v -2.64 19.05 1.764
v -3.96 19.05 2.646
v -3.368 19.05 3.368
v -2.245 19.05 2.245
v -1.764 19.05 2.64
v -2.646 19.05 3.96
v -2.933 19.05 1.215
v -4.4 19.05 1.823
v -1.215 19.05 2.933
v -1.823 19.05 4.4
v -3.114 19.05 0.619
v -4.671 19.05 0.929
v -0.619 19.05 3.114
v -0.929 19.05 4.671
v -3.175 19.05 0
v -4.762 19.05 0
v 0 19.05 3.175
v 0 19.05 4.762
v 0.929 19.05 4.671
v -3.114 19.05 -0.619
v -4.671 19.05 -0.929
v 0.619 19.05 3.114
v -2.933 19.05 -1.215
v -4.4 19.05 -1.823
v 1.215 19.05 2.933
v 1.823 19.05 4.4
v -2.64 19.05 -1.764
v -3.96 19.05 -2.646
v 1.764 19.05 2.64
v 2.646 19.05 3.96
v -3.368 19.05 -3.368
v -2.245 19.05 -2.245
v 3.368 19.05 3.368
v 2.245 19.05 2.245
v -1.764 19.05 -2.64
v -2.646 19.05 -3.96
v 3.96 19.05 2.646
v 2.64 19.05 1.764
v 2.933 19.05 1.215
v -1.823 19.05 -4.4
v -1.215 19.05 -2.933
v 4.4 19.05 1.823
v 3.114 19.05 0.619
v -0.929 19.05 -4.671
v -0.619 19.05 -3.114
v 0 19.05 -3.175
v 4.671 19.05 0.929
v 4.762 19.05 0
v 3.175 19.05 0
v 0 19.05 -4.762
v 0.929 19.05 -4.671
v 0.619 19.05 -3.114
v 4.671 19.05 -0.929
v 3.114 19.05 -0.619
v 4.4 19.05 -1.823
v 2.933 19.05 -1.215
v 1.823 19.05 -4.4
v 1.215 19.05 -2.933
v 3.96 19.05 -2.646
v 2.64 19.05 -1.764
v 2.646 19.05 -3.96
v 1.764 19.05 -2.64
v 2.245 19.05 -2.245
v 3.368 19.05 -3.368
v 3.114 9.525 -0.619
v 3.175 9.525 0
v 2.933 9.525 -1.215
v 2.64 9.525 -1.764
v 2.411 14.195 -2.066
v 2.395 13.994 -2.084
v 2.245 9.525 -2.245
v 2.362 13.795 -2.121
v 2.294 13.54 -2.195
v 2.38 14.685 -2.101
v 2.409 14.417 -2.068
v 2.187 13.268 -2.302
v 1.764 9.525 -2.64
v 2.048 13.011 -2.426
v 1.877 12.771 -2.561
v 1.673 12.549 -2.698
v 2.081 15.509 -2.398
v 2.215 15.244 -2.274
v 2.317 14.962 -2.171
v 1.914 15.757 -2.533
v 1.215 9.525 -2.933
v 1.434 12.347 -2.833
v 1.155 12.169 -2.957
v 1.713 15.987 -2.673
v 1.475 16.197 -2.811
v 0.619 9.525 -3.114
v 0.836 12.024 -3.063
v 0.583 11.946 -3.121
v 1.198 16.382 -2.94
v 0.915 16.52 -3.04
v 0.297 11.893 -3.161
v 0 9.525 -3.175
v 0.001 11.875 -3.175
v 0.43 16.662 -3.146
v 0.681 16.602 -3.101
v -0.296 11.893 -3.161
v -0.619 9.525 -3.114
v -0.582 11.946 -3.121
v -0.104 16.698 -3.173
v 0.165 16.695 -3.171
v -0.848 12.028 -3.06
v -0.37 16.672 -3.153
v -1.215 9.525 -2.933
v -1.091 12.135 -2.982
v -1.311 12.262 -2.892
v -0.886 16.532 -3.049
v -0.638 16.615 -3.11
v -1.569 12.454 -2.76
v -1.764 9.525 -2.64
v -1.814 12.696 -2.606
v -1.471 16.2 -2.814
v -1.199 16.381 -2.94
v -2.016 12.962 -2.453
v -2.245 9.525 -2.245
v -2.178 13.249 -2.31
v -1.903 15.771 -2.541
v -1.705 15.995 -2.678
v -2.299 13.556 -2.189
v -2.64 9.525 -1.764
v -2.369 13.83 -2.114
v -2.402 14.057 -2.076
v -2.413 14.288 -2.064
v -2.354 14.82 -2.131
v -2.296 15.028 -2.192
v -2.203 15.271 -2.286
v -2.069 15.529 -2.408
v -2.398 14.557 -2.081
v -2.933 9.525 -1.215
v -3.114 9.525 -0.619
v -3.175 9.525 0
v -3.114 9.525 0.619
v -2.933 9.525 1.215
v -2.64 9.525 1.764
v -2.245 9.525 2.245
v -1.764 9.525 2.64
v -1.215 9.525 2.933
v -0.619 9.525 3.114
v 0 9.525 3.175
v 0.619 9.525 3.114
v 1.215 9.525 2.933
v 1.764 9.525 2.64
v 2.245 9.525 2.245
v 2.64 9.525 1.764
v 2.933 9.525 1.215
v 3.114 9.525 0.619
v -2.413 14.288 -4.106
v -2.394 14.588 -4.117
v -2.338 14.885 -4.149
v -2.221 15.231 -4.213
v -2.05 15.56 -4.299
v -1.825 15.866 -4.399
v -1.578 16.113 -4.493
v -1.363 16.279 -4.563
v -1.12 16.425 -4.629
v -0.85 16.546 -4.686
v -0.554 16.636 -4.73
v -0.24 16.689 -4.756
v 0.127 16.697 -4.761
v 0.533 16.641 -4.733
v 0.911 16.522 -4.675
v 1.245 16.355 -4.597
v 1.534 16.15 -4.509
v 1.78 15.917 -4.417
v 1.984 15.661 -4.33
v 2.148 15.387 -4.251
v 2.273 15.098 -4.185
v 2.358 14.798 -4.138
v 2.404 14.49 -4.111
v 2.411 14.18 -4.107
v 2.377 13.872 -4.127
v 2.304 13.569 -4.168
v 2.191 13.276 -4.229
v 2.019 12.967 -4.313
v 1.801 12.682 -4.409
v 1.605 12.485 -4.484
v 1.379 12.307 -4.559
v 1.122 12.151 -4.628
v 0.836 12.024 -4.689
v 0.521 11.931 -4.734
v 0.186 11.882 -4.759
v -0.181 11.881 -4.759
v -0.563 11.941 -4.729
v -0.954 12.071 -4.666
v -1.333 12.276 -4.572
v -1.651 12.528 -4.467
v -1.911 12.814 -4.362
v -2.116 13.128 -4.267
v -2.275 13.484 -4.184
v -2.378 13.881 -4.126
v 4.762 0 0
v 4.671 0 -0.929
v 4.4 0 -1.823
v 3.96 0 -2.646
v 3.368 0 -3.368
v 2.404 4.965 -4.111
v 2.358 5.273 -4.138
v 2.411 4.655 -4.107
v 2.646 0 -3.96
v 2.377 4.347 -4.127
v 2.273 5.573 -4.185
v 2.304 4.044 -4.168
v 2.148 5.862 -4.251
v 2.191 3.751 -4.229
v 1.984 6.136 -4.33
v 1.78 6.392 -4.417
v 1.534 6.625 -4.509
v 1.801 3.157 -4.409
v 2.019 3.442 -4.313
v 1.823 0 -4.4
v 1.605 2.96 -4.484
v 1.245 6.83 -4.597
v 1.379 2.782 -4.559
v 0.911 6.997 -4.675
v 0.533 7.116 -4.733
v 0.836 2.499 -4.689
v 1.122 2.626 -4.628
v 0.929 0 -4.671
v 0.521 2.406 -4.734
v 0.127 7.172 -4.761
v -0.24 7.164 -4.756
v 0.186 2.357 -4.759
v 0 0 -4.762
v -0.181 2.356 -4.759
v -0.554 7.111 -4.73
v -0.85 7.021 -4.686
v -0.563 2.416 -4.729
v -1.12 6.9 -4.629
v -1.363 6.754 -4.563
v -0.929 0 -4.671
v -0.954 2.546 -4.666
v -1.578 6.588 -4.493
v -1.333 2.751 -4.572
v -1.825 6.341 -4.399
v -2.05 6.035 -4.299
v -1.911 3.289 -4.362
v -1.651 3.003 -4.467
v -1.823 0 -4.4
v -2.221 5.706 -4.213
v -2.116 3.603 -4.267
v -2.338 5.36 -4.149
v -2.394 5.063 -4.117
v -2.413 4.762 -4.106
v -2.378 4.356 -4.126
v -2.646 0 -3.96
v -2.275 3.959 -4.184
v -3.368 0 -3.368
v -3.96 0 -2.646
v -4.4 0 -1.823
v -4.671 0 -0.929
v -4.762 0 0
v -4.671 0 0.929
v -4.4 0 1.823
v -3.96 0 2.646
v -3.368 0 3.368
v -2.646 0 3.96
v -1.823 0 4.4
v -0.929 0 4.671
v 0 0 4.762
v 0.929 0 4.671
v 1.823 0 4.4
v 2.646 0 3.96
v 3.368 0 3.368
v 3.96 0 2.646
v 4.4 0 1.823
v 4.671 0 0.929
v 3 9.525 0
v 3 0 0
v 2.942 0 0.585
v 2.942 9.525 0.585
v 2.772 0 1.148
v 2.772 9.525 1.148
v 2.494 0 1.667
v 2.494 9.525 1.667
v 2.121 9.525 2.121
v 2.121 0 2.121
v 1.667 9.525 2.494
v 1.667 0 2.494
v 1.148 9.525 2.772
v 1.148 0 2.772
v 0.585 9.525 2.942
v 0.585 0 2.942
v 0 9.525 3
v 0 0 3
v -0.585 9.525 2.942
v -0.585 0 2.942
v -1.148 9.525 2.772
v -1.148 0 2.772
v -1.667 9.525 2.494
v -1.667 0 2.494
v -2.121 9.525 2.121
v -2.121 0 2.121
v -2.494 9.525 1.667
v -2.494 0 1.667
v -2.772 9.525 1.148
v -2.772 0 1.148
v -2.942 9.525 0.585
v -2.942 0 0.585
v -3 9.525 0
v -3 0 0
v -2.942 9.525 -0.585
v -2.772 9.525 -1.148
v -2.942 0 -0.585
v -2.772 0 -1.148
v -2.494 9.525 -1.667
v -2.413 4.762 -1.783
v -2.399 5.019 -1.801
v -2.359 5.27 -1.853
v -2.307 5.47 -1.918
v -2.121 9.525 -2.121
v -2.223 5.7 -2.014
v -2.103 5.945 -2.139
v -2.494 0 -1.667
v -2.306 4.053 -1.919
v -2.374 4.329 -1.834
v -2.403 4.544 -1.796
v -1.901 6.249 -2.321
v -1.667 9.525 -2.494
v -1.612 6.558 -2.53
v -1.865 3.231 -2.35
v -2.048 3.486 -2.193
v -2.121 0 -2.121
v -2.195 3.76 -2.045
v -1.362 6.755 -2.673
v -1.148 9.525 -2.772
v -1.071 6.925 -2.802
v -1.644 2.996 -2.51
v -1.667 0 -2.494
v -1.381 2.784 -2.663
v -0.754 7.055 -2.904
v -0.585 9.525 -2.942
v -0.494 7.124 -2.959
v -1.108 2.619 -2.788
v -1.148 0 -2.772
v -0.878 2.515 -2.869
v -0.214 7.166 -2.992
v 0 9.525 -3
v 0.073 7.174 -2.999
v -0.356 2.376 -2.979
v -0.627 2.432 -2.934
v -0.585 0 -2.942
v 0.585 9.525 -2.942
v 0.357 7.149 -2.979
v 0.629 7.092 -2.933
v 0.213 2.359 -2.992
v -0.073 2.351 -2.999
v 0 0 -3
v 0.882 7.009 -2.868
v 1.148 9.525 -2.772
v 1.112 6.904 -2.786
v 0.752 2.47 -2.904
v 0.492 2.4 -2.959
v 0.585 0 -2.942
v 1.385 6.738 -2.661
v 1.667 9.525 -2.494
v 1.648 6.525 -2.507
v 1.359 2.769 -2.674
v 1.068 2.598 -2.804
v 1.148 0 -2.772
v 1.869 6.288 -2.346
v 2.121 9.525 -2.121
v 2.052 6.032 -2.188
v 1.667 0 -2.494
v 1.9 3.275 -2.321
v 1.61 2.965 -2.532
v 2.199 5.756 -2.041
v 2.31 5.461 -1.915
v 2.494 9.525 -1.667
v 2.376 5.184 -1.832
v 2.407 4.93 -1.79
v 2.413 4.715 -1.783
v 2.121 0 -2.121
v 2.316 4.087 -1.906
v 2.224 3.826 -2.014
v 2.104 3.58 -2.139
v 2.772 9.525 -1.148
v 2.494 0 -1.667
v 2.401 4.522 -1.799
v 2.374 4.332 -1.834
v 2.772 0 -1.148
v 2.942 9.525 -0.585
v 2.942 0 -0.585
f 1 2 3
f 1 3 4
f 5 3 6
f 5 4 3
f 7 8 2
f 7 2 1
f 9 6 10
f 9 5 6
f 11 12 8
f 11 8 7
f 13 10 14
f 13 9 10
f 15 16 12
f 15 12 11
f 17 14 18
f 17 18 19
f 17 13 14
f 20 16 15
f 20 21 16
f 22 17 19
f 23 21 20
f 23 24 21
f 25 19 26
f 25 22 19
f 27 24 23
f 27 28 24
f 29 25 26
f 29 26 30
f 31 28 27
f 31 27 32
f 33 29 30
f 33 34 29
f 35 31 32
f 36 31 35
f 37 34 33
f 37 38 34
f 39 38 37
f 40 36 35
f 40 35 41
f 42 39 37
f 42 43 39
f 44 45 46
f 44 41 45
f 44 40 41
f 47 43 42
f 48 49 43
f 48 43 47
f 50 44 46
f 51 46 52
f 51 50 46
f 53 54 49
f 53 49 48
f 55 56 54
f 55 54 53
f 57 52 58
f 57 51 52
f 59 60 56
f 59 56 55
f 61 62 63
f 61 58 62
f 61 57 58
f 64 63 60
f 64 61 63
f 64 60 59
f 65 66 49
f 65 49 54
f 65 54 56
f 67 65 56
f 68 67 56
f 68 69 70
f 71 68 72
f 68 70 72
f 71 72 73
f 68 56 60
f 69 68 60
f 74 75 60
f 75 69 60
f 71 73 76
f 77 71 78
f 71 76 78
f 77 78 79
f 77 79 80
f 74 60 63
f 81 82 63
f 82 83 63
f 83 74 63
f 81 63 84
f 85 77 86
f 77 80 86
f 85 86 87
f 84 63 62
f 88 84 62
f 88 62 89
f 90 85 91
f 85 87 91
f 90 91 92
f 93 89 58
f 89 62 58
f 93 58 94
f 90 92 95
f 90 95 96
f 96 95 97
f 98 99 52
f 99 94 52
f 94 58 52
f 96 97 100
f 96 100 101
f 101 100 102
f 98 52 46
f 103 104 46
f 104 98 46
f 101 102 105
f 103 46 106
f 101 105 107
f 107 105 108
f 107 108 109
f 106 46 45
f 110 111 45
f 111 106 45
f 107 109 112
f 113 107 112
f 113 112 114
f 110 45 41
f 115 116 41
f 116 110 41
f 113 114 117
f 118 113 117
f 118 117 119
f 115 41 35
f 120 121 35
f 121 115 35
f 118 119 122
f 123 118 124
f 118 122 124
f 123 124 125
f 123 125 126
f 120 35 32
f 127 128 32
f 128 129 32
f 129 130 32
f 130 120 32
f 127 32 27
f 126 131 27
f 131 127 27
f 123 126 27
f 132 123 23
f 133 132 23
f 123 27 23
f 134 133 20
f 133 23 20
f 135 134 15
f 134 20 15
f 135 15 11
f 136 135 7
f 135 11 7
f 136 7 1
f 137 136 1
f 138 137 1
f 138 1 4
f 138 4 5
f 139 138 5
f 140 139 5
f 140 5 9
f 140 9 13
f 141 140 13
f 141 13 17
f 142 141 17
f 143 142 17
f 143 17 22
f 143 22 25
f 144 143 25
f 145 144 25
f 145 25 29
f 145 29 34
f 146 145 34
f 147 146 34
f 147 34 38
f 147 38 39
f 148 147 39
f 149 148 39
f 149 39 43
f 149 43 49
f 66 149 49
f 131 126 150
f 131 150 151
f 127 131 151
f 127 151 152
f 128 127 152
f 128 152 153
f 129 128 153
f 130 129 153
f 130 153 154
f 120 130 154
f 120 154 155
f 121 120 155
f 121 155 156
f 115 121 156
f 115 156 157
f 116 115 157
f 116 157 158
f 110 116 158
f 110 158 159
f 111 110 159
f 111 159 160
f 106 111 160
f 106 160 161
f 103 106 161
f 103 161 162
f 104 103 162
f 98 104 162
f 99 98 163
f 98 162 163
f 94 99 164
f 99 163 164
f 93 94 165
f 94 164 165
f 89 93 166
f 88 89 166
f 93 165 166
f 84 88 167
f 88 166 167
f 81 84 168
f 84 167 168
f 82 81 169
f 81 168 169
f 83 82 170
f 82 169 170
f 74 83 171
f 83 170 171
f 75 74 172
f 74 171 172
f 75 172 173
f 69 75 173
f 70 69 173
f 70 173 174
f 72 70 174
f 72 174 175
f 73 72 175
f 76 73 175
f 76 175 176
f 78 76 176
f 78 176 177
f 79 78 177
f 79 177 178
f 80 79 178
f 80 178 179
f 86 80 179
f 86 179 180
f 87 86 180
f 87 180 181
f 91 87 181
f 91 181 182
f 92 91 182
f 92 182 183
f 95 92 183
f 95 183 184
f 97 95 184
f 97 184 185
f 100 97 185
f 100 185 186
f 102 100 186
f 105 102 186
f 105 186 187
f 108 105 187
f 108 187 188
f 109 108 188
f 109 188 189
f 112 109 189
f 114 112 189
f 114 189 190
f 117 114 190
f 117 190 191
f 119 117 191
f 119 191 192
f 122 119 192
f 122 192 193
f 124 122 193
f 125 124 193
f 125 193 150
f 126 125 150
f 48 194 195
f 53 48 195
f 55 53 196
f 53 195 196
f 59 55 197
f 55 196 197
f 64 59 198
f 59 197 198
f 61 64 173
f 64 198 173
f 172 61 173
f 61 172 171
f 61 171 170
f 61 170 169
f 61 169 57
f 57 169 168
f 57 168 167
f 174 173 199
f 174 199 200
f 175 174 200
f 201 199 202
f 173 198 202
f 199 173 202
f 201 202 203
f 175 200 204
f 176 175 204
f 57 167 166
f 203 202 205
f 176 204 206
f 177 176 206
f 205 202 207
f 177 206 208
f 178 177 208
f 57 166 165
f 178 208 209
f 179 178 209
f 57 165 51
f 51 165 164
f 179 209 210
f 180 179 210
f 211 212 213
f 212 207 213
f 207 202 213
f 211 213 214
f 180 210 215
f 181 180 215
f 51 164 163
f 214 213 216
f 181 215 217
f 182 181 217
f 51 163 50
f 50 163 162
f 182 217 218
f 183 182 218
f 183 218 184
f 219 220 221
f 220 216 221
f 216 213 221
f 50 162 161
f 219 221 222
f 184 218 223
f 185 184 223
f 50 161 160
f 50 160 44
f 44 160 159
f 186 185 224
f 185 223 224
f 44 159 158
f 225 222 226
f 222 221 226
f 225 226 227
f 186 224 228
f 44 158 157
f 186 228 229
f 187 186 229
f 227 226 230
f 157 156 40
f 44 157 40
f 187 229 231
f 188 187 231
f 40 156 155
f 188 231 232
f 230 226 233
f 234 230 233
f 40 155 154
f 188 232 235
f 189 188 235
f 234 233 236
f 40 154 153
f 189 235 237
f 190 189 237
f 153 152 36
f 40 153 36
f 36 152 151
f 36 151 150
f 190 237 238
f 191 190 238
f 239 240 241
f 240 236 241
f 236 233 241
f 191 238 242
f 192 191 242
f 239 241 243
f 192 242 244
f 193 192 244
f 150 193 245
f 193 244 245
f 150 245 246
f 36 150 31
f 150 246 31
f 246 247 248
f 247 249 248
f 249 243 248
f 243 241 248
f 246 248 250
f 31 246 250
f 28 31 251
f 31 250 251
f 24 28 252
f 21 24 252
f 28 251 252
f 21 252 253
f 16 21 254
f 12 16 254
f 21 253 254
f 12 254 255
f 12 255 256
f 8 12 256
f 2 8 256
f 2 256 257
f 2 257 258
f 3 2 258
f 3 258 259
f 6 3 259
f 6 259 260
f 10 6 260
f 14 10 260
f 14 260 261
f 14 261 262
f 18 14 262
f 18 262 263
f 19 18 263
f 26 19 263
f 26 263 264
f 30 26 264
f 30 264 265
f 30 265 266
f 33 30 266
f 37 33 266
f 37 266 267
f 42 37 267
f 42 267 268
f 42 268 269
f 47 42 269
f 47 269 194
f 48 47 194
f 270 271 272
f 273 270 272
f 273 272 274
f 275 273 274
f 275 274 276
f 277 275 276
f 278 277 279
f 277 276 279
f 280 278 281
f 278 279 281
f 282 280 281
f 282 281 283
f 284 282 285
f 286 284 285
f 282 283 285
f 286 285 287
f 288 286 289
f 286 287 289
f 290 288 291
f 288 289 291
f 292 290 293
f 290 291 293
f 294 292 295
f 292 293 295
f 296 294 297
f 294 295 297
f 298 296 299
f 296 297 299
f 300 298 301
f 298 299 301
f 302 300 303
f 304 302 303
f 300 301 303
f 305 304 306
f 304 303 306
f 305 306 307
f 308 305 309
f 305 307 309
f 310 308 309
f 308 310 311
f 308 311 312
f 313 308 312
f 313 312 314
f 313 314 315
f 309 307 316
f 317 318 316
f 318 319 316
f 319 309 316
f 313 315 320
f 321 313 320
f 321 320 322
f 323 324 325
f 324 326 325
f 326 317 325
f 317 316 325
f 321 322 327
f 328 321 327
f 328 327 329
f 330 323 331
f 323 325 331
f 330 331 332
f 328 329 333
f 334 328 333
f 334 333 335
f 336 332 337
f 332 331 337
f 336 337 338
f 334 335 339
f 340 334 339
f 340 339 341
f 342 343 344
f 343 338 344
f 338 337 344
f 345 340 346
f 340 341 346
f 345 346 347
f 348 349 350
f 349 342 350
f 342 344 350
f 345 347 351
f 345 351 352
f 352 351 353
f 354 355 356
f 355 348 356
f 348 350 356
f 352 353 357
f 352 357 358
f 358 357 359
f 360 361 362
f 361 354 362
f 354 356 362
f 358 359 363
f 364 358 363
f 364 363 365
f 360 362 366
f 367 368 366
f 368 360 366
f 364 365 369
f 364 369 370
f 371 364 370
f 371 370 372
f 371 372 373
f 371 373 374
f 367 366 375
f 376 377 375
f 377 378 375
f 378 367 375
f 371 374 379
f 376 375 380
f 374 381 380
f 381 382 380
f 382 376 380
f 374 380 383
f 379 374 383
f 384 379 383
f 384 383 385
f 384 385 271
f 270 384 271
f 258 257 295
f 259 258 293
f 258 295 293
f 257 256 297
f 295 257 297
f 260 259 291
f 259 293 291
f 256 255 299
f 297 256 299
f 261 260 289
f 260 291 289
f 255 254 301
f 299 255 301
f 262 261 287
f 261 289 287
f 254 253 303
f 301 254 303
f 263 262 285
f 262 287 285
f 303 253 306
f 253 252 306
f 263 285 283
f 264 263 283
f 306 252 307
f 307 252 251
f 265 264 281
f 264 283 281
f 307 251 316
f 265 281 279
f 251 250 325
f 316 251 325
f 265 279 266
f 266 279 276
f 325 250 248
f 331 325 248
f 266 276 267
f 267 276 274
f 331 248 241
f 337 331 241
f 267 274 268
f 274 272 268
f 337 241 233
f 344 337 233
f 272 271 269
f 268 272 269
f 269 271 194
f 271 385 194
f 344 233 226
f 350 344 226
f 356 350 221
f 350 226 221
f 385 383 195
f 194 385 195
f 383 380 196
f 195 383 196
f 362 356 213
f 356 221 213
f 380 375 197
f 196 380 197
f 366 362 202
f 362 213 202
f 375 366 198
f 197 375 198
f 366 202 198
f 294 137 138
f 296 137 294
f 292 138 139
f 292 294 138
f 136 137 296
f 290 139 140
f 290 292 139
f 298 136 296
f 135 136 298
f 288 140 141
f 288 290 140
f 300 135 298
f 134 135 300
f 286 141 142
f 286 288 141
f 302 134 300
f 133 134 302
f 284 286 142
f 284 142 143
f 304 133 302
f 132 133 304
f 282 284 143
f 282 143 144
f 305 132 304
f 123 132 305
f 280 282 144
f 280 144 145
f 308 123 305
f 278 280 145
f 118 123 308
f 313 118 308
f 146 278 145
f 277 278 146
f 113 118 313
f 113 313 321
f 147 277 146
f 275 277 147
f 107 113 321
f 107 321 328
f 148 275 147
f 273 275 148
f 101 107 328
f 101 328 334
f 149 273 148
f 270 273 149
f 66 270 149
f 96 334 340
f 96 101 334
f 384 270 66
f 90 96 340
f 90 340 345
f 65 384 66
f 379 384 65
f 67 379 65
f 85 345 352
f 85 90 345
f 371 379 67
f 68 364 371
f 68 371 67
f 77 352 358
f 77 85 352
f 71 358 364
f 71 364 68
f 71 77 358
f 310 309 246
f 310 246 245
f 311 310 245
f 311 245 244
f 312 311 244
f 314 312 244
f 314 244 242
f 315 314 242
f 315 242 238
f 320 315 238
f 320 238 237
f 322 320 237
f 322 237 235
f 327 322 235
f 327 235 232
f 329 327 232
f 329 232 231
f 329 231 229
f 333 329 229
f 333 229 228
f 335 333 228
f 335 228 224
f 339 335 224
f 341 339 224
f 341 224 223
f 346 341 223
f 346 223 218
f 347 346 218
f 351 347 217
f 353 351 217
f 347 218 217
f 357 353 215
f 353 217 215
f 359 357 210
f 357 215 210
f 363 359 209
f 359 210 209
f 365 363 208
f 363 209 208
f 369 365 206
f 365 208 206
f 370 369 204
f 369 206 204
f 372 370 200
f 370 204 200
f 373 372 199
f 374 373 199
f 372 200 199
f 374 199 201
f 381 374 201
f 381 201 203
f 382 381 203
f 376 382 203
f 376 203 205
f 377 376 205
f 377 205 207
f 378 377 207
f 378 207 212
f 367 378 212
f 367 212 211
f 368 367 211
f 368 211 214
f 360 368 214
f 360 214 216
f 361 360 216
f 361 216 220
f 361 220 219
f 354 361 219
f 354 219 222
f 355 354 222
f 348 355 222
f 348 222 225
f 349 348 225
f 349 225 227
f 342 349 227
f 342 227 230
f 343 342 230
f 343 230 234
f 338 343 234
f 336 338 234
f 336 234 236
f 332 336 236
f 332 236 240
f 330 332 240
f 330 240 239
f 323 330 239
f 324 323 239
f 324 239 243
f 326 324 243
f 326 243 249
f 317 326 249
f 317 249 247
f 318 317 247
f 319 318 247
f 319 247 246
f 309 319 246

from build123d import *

# Parameters (mm, degrees)
SKETCH1_R           = 4.7625
BOSS_EXTRUDE1_DEPTH = 19.05
SKETCH2_R           = 3
CUT_EXTRUDE1_DEPTH  = 9.525
SKETCH3_R           = 3.175
CUT_EXTRUDE2_DEPTH  = 9.525
CUT_EXTRUDE3_REACH  = 11.525
SKETCH4_R           = 2.413


with BuildPart() as part:
    # Sketch1 → Boss-Extrude1 (new body)
    with BuildSketch(Plane(origin=(0, 0, 0), x_dir=(1, 0, 0), z_dir=(0, 1, 0))):
        Circle(SKETCH1_R)
    extrude(amount=BOSS_EXTRUDE1_DEPTH)

    # Sketch2 → Cut-Extrude1 (cut)
    with BuildSketch(Plane.XZ):
        Circle(SKETCH2_R)
    extrude(amount=-CUT_EXTRUDE1_DEPTH, mode=Mode.SUBTRACT)

    # Sketch3 → Cut-Extrude2 (cut)
    with BuildSketch(Plane(origin=(0, 19.05, 0), x_dir=(1, 0, 0), z_dir=(0, 1, 0))):
        Circle(SKETCH3_R)
    extrude(amount=-CUT_EXTRUDE2_DEPTH, mode=Mode.SUBTRACT)

    # Sketch4 → Cut-Extrude3 (cut, up to next)
    with BuildSketch(Plane(origin=(0, 0, -4.7625), x_dir=(-1, 0, 0), z_dir=(0, 0, -1)), mode=Mode.PRIVATE) as cut_extrude3_sk1:
        with Locations((0, 14.2875)):
            Circle(SKETCH4_R)
    cut_extrude3_tool1 = extrude(cut_extrude3_sk1.sketch, amount=-CUT_EXTRUDE3_REACH, mode=Mode.PRIVATE) & part.part
    add(cut_extrude3_tool1.solids().sort_by_distance((0, 14.2875, -4.7625))[0], mode=Mode.SUBTRACT)
    # Sketch4 → Cut-Extrude3 (cut, up to next)
    with BuildSketch(Plane(origin=(0, 0, -4.7625), x_dir=(-1, 0, 0), z_dir=(0, 0, -1)), mode=Mode.PRIVATE) as cut_extrude3_sk2:
        with Locations((0, 4.7625)):
            Circle(SKETCH4_R)
    cut_extrude3_tool2 = extrude(cut_extrude3_sk2.sketch, amount=-CUT_EXTRUDE3_REACH, mode=Mode.PRIVATE) & part.part
    add(cut_extrude3_tool2.solids().sort_by_distance((0, 4.7625, -4.7625))[0], mode=Mode.SUBTRACT)


solid = part.part
